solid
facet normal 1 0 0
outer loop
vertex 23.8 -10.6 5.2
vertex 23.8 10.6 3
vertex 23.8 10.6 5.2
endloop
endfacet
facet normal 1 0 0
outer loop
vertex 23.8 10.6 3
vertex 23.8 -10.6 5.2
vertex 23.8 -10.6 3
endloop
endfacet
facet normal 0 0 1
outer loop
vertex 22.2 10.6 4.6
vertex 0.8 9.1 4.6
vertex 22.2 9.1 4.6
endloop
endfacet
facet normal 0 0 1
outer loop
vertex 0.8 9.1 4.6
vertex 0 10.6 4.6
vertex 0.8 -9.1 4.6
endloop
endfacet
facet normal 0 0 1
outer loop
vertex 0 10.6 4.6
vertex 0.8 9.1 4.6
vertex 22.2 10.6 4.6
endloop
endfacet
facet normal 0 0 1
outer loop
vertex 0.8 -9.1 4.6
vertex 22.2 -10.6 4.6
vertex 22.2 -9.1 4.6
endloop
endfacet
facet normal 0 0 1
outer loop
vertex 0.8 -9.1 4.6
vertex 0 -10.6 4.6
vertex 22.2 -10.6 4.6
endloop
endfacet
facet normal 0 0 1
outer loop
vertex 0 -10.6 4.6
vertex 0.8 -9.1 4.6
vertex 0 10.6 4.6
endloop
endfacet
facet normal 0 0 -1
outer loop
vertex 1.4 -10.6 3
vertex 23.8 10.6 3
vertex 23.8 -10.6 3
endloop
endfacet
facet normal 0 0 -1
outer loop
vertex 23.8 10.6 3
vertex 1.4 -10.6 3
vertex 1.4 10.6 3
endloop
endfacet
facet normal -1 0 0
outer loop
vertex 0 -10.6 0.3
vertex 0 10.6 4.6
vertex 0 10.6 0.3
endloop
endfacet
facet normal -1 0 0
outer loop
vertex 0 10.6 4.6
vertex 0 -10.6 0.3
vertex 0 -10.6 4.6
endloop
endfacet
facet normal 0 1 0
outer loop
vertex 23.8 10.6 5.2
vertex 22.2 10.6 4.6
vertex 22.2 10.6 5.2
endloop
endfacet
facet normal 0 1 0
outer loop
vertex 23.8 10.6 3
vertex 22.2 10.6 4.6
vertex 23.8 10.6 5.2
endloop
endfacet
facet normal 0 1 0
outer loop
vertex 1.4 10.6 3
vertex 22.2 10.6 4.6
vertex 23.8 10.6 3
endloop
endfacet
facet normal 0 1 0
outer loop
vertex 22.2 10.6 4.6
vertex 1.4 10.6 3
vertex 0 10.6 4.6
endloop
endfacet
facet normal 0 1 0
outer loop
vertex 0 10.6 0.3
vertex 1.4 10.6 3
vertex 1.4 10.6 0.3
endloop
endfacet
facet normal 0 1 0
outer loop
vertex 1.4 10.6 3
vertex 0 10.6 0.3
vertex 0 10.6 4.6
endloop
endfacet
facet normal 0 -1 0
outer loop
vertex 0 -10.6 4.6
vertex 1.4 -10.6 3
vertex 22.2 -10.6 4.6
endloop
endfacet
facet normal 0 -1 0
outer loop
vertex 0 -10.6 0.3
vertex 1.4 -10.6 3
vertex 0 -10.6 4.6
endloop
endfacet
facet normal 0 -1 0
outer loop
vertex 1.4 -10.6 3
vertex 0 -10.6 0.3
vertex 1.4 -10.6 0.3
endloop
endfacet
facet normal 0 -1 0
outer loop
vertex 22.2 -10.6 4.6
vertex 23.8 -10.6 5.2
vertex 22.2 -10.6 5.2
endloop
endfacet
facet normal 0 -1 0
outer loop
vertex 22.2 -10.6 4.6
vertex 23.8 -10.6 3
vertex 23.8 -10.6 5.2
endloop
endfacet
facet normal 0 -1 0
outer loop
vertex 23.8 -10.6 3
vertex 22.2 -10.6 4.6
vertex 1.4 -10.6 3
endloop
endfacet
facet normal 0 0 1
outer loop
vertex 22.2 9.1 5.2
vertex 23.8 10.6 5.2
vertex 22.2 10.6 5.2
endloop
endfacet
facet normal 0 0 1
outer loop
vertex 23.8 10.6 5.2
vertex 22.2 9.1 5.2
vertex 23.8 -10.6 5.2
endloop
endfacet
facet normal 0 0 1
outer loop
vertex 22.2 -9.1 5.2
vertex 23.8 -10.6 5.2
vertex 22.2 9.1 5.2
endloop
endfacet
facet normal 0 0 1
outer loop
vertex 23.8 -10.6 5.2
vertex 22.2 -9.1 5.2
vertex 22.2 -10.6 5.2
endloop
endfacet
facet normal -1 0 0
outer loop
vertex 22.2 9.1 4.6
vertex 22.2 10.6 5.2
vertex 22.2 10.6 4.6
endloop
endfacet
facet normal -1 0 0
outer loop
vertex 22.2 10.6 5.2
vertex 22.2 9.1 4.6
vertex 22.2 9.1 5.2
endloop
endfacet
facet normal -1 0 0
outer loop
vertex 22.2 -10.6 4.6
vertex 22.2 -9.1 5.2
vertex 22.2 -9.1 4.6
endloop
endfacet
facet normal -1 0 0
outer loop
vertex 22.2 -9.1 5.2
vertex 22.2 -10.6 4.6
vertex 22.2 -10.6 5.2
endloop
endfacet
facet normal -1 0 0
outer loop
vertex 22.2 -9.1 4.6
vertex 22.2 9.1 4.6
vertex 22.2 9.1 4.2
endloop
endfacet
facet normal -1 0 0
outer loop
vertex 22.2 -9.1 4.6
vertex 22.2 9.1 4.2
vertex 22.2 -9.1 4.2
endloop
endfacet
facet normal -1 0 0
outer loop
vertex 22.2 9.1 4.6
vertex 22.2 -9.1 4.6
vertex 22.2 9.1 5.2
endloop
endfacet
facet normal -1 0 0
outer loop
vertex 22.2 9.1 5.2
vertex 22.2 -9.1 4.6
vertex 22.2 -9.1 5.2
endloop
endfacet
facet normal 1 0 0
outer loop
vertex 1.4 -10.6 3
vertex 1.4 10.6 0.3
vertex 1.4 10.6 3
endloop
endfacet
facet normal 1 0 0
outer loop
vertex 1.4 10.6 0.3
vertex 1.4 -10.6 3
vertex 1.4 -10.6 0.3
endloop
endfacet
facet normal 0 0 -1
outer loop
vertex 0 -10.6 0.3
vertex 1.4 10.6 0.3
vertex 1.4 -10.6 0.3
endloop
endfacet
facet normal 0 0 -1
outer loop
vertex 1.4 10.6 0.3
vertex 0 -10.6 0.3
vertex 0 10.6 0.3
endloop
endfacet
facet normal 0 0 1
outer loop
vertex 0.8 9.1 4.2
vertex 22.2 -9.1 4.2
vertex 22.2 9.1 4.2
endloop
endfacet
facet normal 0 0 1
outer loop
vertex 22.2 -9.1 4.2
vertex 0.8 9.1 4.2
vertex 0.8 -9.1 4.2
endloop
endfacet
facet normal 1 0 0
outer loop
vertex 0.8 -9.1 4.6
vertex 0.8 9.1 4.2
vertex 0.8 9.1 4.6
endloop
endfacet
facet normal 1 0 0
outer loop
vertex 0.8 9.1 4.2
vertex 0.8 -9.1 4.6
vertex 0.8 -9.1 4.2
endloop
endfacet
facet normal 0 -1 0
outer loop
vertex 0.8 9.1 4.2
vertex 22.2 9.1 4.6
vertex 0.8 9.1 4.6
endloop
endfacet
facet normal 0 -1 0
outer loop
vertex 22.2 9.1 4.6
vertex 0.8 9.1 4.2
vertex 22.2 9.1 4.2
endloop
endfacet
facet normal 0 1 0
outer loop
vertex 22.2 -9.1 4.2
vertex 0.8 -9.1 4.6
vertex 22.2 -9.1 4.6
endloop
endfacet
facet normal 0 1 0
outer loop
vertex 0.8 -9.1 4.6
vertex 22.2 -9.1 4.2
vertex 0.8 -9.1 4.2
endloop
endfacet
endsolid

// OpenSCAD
// Holder for a Seeed XIAO ESP32-S3 Plus behind an end wall of a Hammond 1590A,
// so the XIAO's own USB-C port is used through the wall (no extra panel socket).
//
// Glue the holder's back face and tab to the inside of the end wall (epoxy),
// below the USB opening. The board lies on the shelf, USB-C toward the wall, in a
// shallow pocket; tape it down. Its pins along both long sides stay free for
// wires. The tab reaches down into the 1.8 mm gap between end wall and lid lip.
// Print on its side (the back face down), PETG or PLA.
//
// Coordinates: x into the box from the inside face of the end wall, y across
// (centred), z up from the rim (where the lid plate sits).

part = "holder"; // [holder, preview]

/* [XIAO ESP32-S3 Plus: measure and adjust] */
xiao_l = 21.0;          // PCB, USB end to the far end
xiao_w = 17.8;
pcb_t = 1.0;            // PCB thickness
usb_overhang = 1.0;     // how far the USB-C receptacle sticks out past the PCB edge
usb_above_pcb = 1.6;    // USB-C centre above the PCB's top surface
fit = 0.2;

/* [Box: Hammond 1590A] */
lip_top = 2.0;          // the lid lip reaches this high into the box...
lip_gap = 1.8;          // ...starting this far from the end wall: (89.1 - 85.5) / 2
clear_w = 22.5;         // free width between the corner bosses at the end walls

/* [Holder] */
shelf_z = 3.0;          // shelf underside above the rim: clears the lid lip
shelf_t = 1.6;
pocket_d = 0.4;         // locating pocket for the PCB
stop_t = 1.6;           // end stop at the far end
tab_t = 1.4;            // glue tab between end wall and lid lip (< lip_gap)
tab_bottom = 0.3;       // tab ends this far above the rim
plug_w = 13.5;          // opening for the USB-C plug's moulding: cut the same into the wall
plug_h = 7.5;

$fn = 32;

// derived
holder_w = xiao_w + 2 * fit + 2 * 1.5;   // 1.5 mm shelf margin each side
pcb_x0 = usb_overhang;                   // receptacle face touches the wall
pcb_z = shelf_z + shelf_t - pocket_d;    // PCB underside
usb_z = pcb_z + pcb_t + usb_above_pcb;   // USB-C centre above the rim
shelf_l = pcb_x0 + xiao_l + fit + stop_t;

assert(holder_w <= clear_w, "holder wider than the space between the corner bosses");
assert(tab_t < lip_gap, "glue tab won't fit between end wall and lid lip");
assert(shelf_z > lip_top, "shelf would sit on the lid lip");
echo(str("USB-C centre is ", usb_z, " mm above the rim: centre the wall opening (",
         plug_w, " x ", plug_h, " mm) there, across the middle of the end wall"));

module holder() {
  difference() {
    union() {
      // shelf
      translate([0, -holder_w / 2, shelf_z]) cube([shelf_l, holder_w, shelf_t]);
      // end stop at the far end, no higher than the PCB's top
      translate([shelf_l - stop_t, -holder_w / 2, shelf_z]) cube([stop_t, holder_w, shelf_t - pocket_d + pcb_t]);
      // glue tab down the wall, into the gap in front of the lid lip
      translate([0, -holder_w / 2, tab_bottom]) cube([tab_t, holder_w, shelf_z - tab_bottom + 0.01]);
    }
    // locating pocket for the PCB
    translate([pcb_x0 - fit, -(xiao_w / 2 + fit), pcb_z]) cube([xiao_l + 2 * fit, xiao_w + 2 * fit, pocket_d + 1]);
  }
}

module preview() {
  color("dimgray") holder();
  color("seagreen") translate([pcb_x0, -xiao_w / 2, pcb_z]) cube([xiao_l, xiao_w, pcb_t]);
  color("silver") translate([0, 0, usb_z]) rotate([0, 90, 0]) linear_extrude(7.5) offset(1.3) square([3.2 - 2.6, 8.9 - 2.6], center = true);
  // end wall with the plug opening
  color("lightgray", 0.4) translate([-1.75, 0, 0]) difference() {
    translate([0, -17.5, 0]) cube([1.75, 35, 25.4]);
    translate([-1, 0, usb_z]) rotate([0, 90, 0]) linear_extrude(4) offset(2) square([plug_h - 4, plug_w - 4], center = true);
  }
}

if (part == "preview") preview();
else holder();
